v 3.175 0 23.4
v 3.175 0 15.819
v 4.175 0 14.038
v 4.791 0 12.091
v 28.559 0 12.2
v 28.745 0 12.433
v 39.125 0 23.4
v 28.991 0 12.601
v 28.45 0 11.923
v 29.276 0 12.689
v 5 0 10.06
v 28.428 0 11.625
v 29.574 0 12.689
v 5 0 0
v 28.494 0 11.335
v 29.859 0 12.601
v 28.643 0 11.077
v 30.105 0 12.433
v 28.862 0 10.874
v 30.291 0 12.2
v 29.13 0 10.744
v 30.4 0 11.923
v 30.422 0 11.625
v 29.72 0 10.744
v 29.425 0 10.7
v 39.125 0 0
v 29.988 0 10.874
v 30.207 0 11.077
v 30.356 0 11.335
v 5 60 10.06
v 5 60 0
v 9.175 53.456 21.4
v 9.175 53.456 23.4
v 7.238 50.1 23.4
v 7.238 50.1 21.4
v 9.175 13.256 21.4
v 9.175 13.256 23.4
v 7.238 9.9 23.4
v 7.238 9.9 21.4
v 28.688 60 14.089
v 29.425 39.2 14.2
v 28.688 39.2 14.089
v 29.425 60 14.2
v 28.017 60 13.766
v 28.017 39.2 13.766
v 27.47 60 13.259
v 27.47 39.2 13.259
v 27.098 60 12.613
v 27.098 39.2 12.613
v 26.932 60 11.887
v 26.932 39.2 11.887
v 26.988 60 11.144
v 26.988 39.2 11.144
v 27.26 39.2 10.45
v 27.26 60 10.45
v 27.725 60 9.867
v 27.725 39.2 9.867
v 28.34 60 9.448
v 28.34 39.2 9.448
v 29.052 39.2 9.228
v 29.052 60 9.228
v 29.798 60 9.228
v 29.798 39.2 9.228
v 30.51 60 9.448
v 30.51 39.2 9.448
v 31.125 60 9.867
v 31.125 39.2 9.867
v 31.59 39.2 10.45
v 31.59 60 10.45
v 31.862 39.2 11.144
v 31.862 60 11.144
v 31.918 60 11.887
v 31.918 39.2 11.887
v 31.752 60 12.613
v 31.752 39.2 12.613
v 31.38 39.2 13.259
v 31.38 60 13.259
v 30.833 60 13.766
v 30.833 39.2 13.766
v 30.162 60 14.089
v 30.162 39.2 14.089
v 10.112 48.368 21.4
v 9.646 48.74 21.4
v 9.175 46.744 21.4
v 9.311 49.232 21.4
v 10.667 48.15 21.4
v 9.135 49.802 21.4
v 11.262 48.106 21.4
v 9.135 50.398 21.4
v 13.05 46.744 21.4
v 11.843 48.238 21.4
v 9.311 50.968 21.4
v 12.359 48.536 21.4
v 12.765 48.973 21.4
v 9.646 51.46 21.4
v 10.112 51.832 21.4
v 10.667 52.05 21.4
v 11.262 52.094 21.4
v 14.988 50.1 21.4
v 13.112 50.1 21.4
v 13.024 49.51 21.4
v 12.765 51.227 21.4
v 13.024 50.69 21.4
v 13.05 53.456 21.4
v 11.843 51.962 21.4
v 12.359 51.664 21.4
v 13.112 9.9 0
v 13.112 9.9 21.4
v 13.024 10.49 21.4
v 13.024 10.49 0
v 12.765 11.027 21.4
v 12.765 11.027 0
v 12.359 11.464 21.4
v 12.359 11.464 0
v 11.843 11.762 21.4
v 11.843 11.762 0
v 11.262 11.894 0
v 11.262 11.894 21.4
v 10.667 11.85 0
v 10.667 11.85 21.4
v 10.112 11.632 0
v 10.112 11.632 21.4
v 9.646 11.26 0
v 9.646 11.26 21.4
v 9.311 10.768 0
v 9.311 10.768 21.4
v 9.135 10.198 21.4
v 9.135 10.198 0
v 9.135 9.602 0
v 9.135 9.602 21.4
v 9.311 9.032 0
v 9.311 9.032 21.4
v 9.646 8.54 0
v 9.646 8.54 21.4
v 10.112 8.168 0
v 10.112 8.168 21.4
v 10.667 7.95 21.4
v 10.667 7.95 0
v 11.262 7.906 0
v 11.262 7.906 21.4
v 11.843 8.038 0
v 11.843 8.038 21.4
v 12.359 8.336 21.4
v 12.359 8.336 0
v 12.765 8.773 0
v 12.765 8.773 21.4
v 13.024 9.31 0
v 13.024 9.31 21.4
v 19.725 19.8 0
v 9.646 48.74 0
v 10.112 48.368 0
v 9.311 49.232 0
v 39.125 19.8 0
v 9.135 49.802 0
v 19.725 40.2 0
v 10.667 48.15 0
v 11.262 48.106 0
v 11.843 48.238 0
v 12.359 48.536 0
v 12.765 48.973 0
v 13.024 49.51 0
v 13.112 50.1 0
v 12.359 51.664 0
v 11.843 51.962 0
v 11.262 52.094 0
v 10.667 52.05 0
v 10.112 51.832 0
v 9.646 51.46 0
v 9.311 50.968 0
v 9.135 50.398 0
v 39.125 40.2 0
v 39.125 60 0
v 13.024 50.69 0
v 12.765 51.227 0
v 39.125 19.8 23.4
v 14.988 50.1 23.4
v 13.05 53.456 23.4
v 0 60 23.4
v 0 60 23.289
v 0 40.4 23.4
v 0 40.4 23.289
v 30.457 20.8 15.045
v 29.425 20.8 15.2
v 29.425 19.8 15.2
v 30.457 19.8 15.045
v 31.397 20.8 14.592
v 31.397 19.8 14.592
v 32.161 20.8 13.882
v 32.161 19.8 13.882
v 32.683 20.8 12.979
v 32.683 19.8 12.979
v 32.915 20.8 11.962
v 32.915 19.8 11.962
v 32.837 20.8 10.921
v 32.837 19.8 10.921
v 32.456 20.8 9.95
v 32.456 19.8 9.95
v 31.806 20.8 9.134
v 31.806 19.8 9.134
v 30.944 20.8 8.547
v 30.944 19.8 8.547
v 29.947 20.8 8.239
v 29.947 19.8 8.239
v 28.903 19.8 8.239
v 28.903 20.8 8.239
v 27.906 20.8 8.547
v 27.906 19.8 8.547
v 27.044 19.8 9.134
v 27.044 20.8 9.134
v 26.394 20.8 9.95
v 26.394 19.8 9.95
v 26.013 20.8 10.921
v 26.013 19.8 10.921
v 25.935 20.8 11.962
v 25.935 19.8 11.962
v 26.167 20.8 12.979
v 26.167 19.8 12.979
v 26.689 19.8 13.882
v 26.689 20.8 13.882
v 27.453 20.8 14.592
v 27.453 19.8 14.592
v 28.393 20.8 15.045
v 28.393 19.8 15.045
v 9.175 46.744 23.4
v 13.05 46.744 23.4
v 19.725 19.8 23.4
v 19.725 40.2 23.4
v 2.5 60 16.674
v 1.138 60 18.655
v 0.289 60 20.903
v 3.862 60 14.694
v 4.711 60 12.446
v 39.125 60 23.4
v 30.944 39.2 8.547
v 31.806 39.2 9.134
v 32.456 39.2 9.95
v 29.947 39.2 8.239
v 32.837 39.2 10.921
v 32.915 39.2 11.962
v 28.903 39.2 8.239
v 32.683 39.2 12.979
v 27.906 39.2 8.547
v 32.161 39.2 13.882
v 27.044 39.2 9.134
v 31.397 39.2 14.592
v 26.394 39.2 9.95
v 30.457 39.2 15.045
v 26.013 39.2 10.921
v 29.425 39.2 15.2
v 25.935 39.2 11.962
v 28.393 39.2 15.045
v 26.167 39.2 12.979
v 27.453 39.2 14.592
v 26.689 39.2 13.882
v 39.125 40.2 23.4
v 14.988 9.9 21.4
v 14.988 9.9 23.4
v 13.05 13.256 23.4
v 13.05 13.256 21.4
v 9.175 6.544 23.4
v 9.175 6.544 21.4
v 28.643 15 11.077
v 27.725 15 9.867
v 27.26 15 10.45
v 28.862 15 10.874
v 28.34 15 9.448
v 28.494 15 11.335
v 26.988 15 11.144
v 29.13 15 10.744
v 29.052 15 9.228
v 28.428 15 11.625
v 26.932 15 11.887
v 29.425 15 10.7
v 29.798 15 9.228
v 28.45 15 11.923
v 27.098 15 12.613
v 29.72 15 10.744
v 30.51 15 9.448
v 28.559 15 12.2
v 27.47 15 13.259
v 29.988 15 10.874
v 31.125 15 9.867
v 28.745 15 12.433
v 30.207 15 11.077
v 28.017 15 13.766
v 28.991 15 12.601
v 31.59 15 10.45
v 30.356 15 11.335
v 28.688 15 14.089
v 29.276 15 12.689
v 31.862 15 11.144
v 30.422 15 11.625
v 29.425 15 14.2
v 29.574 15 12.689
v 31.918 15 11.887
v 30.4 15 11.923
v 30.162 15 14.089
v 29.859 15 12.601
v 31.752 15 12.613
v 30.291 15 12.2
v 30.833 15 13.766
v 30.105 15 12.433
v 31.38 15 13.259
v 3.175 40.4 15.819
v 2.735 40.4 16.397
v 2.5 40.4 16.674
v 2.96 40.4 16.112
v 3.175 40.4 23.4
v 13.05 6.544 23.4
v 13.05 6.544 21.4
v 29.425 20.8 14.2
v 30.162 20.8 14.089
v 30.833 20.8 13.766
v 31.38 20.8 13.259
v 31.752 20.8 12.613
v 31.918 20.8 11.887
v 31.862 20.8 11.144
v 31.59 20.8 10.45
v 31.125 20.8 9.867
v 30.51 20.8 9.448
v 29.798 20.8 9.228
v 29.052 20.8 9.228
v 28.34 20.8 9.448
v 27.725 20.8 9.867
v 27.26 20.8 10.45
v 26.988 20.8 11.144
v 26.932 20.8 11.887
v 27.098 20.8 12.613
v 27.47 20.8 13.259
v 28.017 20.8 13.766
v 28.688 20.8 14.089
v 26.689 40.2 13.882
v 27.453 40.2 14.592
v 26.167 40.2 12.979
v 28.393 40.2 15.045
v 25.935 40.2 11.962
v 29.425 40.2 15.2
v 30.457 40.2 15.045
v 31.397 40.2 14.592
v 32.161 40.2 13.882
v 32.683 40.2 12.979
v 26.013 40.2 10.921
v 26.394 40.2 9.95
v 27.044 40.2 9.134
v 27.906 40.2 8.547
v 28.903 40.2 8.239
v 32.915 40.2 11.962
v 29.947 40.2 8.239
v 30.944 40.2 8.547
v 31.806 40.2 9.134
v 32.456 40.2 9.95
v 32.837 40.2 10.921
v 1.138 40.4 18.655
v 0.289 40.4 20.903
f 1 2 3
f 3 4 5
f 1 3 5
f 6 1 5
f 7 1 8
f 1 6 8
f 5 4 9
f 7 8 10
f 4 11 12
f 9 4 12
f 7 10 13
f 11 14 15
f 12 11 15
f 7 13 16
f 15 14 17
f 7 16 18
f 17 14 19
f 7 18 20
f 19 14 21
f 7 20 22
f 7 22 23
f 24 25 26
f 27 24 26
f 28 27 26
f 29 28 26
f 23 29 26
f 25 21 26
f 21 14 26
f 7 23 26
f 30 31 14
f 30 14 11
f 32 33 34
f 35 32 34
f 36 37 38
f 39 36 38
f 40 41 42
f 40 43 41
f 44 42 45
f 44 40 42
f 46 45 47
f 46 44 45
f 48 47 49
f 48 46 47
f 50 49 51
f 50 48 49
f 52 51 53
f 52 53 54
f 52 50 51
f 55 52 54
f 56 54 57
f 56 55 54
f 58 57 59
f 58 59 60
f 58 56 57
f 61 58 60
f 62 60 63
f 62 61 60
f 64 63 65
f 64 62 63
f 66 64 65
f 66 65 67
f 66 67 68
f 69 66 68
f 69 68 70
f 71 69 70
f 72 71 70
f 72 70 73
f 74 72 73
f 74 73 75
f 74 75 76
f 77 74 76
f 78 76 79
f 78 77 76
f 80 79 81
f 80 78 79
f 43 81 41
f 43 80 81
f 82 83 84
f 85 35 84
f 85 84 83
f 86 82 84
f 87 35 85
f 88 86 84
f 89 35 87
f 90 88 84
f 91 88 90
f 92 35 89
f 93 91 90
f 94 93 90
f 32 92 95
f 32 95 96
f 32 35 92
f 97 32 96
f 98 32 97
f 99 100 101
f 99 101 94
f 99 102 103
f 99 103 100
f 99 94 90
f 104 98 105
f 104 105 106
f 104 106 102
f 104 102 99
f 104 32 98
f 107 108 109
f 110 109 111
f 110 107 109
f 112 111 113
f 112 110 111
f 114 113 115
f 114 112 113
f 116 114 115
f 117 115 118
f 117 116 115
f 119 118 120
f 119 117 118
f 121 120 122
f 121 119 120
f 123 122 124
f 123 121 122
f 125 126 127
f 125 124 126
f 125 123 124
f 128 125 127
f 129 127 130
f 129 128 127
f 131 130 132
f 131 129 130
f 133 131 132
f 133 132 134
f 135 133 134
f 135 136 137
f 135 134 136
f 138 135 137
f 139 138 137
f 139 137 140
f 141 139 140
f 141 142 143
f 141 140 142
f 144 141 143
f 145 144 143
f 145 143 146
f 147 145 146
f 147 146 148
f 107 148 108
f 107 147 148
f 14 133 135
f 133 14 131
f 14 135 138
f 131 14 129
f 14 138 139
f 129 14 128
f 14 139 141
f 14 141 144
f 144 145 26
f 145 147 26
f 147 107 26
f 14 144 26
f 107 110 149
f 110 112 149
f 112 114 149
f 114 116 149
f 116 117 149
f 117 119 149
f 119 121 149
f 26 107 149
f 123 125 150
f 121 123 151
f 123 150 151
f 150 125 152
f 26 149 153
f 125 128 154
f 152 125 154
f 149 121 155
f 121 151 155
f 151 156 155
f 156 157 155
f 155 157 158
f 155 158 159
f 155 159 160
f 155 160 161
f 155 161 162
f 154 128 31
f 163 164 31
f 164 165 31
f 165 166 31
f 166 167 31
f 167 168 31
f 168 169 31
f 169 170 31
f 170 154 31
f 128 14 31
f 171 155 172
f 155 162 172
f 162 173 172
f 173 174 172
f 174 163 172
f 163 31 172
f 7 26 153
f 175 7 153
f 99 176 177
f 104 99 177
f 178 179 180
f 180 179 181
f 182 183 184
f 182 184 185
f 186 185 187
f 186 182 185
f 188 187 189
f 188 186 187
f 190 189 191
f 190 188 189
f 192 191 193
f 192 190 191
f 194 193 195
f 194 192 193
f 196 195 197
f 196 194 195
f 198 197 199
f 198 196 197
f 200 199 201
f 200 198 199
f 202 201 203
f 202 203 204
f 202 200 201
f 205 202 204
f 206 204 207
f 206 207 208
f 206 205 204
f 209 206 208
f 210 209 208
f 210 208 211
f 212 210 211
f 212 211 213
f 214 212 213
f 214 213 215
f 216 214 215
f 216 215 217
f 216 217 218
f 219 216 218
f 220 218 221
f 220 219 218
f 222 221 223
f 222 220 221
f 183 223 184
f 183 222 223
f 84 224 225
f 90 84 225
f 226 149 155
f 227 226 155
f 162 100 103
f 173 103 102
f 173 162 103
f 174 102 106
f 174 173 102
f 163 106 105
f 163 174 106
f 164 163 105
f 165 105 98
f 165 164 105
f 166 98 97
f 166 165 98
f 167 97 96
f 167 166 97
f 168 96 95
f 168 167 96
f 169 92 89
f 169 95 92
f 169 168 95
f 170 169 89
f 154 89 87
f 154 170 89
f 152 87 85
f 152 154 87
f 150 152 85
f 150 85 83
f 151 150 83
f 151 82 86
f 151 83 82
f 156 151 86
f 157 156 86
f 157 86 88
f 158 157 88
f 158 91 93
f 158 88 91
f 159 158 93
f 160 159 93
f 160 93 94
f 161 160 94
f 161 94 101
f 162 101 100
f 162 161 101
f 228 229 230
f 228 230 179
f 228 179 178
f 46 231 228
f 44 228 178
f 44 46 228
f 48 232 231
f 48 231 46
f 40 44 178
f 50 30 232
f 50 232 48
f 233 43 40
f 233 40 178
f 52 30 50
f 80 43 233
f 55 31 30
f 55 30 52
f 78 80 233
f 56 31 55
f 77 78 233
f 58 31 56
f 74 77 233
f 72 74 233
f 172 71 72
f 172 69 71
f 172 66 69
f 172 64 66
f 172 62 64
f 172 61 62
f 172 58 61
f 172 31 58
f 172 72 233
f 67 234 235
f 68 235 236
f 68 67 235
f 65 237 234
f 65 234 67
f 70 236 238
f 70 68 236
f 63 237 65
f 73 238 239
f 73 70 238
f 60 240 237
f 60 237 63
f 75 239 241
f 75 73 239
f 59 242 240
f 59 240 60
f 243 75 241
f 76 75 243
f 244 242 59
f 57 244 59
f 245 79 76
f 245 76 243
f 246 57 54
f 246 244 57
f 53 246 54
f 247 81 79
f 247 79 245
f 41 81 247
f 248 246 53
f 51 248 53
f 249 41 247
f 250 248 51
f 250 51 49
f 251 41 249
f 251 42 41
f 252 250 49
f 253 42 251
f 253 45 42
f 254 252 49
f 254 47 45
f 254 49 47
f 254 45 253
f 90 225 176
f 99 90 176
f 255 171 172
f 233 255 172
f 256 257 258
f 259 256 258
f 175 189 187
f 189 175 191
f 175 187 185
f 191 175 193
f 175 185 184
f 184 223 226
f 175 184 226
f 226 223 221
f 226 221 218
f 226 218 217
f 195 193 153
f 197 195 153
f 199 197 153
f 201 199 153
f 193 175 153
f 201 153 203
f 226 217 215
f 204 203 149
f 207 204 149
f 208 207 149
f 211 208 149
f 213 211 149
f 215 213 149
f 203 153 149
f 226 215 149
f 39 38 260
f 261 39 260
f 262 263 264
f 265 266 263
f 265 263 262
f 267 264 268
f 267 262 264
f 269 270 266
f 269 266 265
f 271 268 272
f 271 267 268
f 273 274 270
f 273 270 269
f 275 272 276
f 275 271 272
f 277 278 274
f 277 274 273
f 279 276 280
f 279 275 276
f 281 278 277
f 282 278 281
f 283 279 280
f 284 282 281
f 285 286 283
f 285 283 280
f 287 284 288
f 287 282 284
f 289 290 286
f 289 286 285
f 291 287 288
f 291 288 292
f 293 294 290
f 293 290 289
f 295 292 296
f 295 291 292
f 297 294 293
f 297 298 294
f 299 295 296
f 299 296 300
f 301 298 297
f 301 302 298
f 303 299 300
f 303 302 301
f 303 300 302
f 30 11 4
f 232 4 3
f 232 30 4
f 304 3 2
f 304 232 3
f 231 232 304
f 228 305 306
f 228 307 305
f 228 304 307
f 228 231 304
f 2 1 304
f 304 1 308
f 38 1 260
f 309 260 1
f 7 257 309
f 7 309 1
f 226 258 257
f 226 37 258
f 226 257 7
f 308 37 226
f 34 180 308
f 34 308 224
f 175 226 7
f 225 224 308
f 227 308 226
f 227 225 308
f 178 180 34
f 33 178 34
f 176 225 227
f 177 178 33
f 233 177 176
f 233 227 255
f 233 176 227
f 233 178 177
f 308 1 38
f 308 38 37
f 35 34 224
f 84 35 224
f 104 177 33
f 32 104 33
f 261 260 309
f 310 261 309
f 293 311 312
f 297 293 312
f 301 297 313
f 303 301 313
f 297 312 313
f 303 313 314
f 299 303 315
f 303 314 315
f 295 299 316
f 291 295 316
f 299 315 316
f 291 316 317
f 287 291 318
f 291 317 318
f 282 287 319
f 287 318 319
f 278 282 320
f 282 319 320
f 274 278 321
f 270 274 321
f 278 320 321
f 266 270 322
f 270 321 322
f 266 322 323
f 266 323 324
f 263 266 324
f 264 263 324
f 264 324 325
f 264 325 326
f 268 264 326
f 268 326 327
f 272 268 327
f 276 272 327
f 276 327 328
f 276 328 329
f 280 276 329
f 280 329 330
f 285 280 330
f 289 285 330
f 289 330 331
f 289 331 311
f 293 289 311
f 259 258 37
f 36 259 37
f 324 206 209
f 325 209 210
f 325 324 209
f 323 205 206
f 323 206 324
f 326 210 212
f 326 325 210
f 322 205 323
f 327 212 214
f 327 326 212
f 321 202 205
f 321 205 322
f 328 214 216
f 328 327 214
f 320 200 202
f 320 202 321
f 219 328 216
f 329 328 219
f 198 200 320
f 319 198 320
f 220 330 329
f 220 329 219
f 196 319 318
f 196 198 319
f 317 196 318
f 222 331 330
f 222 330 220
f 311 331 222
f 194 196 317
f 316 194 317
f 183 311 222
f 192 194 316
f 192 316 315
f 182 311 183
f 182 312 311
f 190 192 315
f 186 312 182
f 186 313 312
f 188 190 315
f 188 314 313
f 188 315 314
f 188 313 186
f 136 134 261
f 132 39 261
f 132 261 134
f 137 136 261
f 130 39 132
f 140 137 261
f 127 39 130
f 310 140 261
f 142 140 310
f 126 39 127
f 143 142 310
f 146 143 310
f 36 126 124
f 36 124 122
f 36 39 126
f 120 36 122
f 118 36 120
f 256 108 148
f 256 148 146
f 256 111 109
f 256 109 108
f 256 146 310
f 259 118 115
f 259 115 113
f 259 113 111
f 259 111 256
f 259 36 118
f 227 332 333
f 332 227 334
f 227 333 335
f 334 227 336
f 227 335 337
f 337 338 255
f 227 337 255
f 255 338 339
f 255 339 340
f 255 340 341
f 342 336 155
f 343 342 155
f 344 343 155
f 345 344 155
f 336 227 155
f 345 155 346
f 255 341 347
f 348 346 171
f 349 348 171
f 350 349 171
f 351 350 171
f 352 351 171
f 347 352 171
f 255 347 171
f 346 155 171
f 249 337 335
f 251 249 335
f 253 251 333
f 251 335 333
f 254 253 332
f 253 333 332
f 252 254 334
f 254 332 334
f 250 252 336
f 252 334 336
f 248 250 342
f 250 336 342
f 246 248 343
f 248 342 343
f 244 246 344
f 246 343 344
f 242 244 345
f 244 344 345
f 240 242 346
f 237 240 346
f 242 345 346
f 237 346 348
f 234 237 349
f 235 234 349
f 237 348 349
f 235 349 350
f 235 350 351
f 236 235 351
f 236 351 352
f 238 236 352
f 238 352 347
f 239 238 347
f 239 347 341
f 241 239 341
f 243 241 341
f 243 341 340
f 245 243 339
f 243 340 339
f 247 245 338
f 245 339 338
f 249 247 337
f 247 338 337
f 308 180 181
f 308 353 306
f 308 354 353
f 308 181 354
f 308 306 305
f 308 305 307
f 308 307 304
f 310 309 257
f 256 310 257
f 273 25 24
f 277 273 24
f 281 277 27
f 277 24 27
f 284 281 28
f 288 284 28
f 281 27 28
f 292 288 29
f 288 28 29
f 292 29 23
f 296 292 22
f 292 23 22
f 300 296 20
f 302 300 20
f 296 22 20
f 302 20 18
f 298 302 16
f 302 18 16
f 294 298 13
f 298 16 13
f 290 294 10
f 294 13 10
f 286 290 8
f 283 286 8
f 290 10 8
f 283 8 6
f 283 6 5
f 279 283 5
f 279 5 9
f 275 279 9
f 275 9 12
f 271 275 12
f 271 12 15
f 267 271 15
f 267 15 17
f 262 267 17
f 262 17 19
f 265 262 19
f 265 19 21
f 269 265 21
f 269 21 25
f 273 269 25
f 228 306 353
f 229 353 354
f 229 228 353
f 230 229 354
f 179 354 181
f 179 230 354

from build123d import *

# Parameters (mm, degrees)
MAINBLOCK_R                      = 2
MAINBLOCKBOSS_EXTRUDE1_DEPTH     = 23.4
TOPHOLECUT_SKETCH2_R             = 2.5
TOPHOLECUT_EXTRUDE1_DEPTH        = 45
MOUNTHOLEBORECUT_EXTRUDE2_DEPTH  = 2
TOPSPACERSKETCH4_R               = 3.5
TOPSPACERSKETCH4_R_2             = 2.5
TOPSPACERBOSS_EXTRUDE2_DEPTH     = 1
LOWERSPACERBOSS_EXTRUDE3_START   = 1
LOWERSPACERSKETCH5_R             = 3.5
LOWERSPACERSKETCH5_R_2           = 2.5
LOWERSPACERBOSS_EXTRUDE3_DEPTH   = 1
PUSHPINHOLESKETCH1_R             = 1
PUSHPINHOLECUT_EXTRUDE1_DEPTH    = 76.354665582
SCREWCOLLISIONSKETCH2_W          = 18.72
SCREWCOLLISIONSKETCH2_H          = 60
SCREWCOLLISIONCUT_EXTRUDE2_DEPTH = 5
SCREWCOLLISIONFILLET1_R          = 10
SCREWCOLLISIONFILLET2_R          = 10
MIDRAILINDENTSKETCH1_W           = 3.175
MIDRAILINDENTSKETCH1_H           = 40.4
MIDRAILINDENTCUT_EXTRUDE1_DEPTH  = 76.354665582


with BuildPart() as part:
    # MainBlock → MainBlockBoss-Extrude1 (new body)
    with BuildSketch(Plane.XY):
        Polygon((0, 0), (39.125, 0), (39.125, 19.8), (19.725, 19.8), (19.725, 40.2), (39.125, 40.2), (39.125, 60), (0, 60), align=None)
        with Locations((11.1125, 50.1)):
            Circle(MAINBLOCK_R, mode=Mode.SUBTRACT)
        with Locations((11.1125, 9.9)):
            Circle(MAINBLOCK_R, mode=Mode.SUBTRACT)
    extrude(amount=MAINBLOCKBOSS_EXTRUDE1_DEPTH)

    # TopHoleCut-Sketch2 → TopHoleCut-Extrude1 (cut)
    with BuildSketch(Plane(origin=(0, 60, 0), x_dir=(1, 0, 0), z_dir=(0, 1, 0))):
        with Locations(Location((29.425, -11.7, 0), (0, 0, 270))):
            Circle(TOPHOLECUT_SKETCH2_R)
    extrude(amount=-TOPHOLECUT_EXTRUDE1_DEPTH, mode=Mode.SUBTRACT)

    # MountHoleBoreSketch3 → MountHoleBoreCut-Extrude2 (cut)
    with BuildSketch(Plane.XY.offset(23.4)):
        Polygon((14.9875, 50.1), (13.05, 53.45584844), (9.175, 53.45584844), (7.2375, 50.1), (9.175, 46.74415156), (13.05, 46.74415156), align=None)
        Polygon((14.9875, 9.9), (13.05, 13.25584844), (9.175, 13.25584844), (7.2375, 9.9), (9.175, 6.54415156), (13.05, 6.54415156), align=None)
    extrude(amount=-MOUNTHOLEBORECUT_EXTRUDE2_DEPTH, mode=Mode.SUBTRACT)

    # TopSpacerSketch4 → TopSpacerBoss-Extrude2 (add)
    with BuildSketch(Plane.XZ.offset(-40.2)):
        with Locations(Location((29.425, 11.7, 0), (0, 0, 90))):
            Circle(TOPSPACERSKETCH4_R)
        with Locations(Location((29.425, 11.7, 0), (0, 0, 90))):
            Circle(TOPSPACERSKETCH4_R_2, mode=Mode.SUBTRACT)
    extrude(amount=TOPSPACERBOSS_EXTRUDE2_DEPTH)

    # LowerSpacerSketch5 → LowerSpacerBoss-Extrude3 (add)
    with BuildSketch(Plane(origin=(0, 19.8, 0), x_dir=(1, 0, 0), z_dir=(0, 1, 0)).offset(LOWERSPACERBOSS_EXTRUDE3_START)):
        with Locations(Location((29.425, -11.7, 0), (0, 0, 270))):
            Circle(LOWERSPACERSKETCH5_R)
        with Locations(Location((29.425, -11.7, 0), (0, 0, 270))):
            Circle(LOWERSPACERSKETCH5_R_2, mode=Mode.SUBTRACT)
    extrude(amount=-LOWERSPACERBOSS_EXTRUDE3_DEPTH)

    # PushPinHoleSketch1 → PushPinHoleCut-Extrude1 (cut, through all)
    with BuildSketch(Plane.XZ):
        with Locations(Location((29.425, 11.7, 0), (0, 0, 270))):
            Circle(PUSHPINHOLESKETCH1_R)
    extrude(amount=-PUSHPINHOLECUT_EXTRUDE1_DEPTH, mode=Mode.SUBTRACT)

    # ScrewCollisionSketch2 → ScrewCollisionCut-Extrude2 (cut)
    with BuildSketch(Plane.ZY):
        with Locations((9.36, 30)):
            Rectangle(SCREWCOLLISIONSKETCH2_W, SCREWCOLLISIONSKETCH2_H)
    extrude(amount=-SCREWCOLLISIONCUT_EXTRUDE2_DEPTH, mode=Mode.SUBTRACT)

    # ScrewCollisionFillet1
    # the kernel refuses this fillet: 10 mm, written as the material it adds along each edge
    with BuildSketch(Plane(origin=(5, 60, 18.72), x_dir=(-1, 0, 0), z_dir=(0, -1, 0))) as screwcollisionfillet1_piece_1:
        with BuildLine():
            CenterArc((10, 8.660254038), SCREWCOLLISIONFILLET1_R, 180, 60)
            Line((0, 8.660254038), (-0.2, 8.660254038))
            Line((-0.2, 8.660254038), (-0.2, 0))
            Line((-0.2, 0), (0, -0.2))
            ThreePointArc((0, -0.2), (2.5, -0.2), (4.9, -0.173205081))
            Line((4.9, -0.173205081), (5, 0))
        make_face()
    extrude(amount=60)

    # ScrewCollisionFillet2
    screwcollisionfillet2_edges = [part.edges().sort_by_distance(p)[0] for p in [
        (0, 30, 18.72),
    ]]
    fillet(screwcollisionfillet2_edges, radius=SCREWCOLLISIONFILLET2_R)

    # MidRailIndentSketch1 → MidRailIndentCut-Extrude1 (cut, through all)
    with BuildSketch(Plane.XY.offset(23.4)):
        with Locations((1.5875, 20.2)):
            Rectangle(MIDRAILINDENTSKETCH1_W, MIDRAILINDENTSKETCH1_H)
    extrude(amount=-MIDRAILINDENTCUT_EXTRUDE1_DEPTH, mode=Mode.SUBTRACT)


solid = part.part
